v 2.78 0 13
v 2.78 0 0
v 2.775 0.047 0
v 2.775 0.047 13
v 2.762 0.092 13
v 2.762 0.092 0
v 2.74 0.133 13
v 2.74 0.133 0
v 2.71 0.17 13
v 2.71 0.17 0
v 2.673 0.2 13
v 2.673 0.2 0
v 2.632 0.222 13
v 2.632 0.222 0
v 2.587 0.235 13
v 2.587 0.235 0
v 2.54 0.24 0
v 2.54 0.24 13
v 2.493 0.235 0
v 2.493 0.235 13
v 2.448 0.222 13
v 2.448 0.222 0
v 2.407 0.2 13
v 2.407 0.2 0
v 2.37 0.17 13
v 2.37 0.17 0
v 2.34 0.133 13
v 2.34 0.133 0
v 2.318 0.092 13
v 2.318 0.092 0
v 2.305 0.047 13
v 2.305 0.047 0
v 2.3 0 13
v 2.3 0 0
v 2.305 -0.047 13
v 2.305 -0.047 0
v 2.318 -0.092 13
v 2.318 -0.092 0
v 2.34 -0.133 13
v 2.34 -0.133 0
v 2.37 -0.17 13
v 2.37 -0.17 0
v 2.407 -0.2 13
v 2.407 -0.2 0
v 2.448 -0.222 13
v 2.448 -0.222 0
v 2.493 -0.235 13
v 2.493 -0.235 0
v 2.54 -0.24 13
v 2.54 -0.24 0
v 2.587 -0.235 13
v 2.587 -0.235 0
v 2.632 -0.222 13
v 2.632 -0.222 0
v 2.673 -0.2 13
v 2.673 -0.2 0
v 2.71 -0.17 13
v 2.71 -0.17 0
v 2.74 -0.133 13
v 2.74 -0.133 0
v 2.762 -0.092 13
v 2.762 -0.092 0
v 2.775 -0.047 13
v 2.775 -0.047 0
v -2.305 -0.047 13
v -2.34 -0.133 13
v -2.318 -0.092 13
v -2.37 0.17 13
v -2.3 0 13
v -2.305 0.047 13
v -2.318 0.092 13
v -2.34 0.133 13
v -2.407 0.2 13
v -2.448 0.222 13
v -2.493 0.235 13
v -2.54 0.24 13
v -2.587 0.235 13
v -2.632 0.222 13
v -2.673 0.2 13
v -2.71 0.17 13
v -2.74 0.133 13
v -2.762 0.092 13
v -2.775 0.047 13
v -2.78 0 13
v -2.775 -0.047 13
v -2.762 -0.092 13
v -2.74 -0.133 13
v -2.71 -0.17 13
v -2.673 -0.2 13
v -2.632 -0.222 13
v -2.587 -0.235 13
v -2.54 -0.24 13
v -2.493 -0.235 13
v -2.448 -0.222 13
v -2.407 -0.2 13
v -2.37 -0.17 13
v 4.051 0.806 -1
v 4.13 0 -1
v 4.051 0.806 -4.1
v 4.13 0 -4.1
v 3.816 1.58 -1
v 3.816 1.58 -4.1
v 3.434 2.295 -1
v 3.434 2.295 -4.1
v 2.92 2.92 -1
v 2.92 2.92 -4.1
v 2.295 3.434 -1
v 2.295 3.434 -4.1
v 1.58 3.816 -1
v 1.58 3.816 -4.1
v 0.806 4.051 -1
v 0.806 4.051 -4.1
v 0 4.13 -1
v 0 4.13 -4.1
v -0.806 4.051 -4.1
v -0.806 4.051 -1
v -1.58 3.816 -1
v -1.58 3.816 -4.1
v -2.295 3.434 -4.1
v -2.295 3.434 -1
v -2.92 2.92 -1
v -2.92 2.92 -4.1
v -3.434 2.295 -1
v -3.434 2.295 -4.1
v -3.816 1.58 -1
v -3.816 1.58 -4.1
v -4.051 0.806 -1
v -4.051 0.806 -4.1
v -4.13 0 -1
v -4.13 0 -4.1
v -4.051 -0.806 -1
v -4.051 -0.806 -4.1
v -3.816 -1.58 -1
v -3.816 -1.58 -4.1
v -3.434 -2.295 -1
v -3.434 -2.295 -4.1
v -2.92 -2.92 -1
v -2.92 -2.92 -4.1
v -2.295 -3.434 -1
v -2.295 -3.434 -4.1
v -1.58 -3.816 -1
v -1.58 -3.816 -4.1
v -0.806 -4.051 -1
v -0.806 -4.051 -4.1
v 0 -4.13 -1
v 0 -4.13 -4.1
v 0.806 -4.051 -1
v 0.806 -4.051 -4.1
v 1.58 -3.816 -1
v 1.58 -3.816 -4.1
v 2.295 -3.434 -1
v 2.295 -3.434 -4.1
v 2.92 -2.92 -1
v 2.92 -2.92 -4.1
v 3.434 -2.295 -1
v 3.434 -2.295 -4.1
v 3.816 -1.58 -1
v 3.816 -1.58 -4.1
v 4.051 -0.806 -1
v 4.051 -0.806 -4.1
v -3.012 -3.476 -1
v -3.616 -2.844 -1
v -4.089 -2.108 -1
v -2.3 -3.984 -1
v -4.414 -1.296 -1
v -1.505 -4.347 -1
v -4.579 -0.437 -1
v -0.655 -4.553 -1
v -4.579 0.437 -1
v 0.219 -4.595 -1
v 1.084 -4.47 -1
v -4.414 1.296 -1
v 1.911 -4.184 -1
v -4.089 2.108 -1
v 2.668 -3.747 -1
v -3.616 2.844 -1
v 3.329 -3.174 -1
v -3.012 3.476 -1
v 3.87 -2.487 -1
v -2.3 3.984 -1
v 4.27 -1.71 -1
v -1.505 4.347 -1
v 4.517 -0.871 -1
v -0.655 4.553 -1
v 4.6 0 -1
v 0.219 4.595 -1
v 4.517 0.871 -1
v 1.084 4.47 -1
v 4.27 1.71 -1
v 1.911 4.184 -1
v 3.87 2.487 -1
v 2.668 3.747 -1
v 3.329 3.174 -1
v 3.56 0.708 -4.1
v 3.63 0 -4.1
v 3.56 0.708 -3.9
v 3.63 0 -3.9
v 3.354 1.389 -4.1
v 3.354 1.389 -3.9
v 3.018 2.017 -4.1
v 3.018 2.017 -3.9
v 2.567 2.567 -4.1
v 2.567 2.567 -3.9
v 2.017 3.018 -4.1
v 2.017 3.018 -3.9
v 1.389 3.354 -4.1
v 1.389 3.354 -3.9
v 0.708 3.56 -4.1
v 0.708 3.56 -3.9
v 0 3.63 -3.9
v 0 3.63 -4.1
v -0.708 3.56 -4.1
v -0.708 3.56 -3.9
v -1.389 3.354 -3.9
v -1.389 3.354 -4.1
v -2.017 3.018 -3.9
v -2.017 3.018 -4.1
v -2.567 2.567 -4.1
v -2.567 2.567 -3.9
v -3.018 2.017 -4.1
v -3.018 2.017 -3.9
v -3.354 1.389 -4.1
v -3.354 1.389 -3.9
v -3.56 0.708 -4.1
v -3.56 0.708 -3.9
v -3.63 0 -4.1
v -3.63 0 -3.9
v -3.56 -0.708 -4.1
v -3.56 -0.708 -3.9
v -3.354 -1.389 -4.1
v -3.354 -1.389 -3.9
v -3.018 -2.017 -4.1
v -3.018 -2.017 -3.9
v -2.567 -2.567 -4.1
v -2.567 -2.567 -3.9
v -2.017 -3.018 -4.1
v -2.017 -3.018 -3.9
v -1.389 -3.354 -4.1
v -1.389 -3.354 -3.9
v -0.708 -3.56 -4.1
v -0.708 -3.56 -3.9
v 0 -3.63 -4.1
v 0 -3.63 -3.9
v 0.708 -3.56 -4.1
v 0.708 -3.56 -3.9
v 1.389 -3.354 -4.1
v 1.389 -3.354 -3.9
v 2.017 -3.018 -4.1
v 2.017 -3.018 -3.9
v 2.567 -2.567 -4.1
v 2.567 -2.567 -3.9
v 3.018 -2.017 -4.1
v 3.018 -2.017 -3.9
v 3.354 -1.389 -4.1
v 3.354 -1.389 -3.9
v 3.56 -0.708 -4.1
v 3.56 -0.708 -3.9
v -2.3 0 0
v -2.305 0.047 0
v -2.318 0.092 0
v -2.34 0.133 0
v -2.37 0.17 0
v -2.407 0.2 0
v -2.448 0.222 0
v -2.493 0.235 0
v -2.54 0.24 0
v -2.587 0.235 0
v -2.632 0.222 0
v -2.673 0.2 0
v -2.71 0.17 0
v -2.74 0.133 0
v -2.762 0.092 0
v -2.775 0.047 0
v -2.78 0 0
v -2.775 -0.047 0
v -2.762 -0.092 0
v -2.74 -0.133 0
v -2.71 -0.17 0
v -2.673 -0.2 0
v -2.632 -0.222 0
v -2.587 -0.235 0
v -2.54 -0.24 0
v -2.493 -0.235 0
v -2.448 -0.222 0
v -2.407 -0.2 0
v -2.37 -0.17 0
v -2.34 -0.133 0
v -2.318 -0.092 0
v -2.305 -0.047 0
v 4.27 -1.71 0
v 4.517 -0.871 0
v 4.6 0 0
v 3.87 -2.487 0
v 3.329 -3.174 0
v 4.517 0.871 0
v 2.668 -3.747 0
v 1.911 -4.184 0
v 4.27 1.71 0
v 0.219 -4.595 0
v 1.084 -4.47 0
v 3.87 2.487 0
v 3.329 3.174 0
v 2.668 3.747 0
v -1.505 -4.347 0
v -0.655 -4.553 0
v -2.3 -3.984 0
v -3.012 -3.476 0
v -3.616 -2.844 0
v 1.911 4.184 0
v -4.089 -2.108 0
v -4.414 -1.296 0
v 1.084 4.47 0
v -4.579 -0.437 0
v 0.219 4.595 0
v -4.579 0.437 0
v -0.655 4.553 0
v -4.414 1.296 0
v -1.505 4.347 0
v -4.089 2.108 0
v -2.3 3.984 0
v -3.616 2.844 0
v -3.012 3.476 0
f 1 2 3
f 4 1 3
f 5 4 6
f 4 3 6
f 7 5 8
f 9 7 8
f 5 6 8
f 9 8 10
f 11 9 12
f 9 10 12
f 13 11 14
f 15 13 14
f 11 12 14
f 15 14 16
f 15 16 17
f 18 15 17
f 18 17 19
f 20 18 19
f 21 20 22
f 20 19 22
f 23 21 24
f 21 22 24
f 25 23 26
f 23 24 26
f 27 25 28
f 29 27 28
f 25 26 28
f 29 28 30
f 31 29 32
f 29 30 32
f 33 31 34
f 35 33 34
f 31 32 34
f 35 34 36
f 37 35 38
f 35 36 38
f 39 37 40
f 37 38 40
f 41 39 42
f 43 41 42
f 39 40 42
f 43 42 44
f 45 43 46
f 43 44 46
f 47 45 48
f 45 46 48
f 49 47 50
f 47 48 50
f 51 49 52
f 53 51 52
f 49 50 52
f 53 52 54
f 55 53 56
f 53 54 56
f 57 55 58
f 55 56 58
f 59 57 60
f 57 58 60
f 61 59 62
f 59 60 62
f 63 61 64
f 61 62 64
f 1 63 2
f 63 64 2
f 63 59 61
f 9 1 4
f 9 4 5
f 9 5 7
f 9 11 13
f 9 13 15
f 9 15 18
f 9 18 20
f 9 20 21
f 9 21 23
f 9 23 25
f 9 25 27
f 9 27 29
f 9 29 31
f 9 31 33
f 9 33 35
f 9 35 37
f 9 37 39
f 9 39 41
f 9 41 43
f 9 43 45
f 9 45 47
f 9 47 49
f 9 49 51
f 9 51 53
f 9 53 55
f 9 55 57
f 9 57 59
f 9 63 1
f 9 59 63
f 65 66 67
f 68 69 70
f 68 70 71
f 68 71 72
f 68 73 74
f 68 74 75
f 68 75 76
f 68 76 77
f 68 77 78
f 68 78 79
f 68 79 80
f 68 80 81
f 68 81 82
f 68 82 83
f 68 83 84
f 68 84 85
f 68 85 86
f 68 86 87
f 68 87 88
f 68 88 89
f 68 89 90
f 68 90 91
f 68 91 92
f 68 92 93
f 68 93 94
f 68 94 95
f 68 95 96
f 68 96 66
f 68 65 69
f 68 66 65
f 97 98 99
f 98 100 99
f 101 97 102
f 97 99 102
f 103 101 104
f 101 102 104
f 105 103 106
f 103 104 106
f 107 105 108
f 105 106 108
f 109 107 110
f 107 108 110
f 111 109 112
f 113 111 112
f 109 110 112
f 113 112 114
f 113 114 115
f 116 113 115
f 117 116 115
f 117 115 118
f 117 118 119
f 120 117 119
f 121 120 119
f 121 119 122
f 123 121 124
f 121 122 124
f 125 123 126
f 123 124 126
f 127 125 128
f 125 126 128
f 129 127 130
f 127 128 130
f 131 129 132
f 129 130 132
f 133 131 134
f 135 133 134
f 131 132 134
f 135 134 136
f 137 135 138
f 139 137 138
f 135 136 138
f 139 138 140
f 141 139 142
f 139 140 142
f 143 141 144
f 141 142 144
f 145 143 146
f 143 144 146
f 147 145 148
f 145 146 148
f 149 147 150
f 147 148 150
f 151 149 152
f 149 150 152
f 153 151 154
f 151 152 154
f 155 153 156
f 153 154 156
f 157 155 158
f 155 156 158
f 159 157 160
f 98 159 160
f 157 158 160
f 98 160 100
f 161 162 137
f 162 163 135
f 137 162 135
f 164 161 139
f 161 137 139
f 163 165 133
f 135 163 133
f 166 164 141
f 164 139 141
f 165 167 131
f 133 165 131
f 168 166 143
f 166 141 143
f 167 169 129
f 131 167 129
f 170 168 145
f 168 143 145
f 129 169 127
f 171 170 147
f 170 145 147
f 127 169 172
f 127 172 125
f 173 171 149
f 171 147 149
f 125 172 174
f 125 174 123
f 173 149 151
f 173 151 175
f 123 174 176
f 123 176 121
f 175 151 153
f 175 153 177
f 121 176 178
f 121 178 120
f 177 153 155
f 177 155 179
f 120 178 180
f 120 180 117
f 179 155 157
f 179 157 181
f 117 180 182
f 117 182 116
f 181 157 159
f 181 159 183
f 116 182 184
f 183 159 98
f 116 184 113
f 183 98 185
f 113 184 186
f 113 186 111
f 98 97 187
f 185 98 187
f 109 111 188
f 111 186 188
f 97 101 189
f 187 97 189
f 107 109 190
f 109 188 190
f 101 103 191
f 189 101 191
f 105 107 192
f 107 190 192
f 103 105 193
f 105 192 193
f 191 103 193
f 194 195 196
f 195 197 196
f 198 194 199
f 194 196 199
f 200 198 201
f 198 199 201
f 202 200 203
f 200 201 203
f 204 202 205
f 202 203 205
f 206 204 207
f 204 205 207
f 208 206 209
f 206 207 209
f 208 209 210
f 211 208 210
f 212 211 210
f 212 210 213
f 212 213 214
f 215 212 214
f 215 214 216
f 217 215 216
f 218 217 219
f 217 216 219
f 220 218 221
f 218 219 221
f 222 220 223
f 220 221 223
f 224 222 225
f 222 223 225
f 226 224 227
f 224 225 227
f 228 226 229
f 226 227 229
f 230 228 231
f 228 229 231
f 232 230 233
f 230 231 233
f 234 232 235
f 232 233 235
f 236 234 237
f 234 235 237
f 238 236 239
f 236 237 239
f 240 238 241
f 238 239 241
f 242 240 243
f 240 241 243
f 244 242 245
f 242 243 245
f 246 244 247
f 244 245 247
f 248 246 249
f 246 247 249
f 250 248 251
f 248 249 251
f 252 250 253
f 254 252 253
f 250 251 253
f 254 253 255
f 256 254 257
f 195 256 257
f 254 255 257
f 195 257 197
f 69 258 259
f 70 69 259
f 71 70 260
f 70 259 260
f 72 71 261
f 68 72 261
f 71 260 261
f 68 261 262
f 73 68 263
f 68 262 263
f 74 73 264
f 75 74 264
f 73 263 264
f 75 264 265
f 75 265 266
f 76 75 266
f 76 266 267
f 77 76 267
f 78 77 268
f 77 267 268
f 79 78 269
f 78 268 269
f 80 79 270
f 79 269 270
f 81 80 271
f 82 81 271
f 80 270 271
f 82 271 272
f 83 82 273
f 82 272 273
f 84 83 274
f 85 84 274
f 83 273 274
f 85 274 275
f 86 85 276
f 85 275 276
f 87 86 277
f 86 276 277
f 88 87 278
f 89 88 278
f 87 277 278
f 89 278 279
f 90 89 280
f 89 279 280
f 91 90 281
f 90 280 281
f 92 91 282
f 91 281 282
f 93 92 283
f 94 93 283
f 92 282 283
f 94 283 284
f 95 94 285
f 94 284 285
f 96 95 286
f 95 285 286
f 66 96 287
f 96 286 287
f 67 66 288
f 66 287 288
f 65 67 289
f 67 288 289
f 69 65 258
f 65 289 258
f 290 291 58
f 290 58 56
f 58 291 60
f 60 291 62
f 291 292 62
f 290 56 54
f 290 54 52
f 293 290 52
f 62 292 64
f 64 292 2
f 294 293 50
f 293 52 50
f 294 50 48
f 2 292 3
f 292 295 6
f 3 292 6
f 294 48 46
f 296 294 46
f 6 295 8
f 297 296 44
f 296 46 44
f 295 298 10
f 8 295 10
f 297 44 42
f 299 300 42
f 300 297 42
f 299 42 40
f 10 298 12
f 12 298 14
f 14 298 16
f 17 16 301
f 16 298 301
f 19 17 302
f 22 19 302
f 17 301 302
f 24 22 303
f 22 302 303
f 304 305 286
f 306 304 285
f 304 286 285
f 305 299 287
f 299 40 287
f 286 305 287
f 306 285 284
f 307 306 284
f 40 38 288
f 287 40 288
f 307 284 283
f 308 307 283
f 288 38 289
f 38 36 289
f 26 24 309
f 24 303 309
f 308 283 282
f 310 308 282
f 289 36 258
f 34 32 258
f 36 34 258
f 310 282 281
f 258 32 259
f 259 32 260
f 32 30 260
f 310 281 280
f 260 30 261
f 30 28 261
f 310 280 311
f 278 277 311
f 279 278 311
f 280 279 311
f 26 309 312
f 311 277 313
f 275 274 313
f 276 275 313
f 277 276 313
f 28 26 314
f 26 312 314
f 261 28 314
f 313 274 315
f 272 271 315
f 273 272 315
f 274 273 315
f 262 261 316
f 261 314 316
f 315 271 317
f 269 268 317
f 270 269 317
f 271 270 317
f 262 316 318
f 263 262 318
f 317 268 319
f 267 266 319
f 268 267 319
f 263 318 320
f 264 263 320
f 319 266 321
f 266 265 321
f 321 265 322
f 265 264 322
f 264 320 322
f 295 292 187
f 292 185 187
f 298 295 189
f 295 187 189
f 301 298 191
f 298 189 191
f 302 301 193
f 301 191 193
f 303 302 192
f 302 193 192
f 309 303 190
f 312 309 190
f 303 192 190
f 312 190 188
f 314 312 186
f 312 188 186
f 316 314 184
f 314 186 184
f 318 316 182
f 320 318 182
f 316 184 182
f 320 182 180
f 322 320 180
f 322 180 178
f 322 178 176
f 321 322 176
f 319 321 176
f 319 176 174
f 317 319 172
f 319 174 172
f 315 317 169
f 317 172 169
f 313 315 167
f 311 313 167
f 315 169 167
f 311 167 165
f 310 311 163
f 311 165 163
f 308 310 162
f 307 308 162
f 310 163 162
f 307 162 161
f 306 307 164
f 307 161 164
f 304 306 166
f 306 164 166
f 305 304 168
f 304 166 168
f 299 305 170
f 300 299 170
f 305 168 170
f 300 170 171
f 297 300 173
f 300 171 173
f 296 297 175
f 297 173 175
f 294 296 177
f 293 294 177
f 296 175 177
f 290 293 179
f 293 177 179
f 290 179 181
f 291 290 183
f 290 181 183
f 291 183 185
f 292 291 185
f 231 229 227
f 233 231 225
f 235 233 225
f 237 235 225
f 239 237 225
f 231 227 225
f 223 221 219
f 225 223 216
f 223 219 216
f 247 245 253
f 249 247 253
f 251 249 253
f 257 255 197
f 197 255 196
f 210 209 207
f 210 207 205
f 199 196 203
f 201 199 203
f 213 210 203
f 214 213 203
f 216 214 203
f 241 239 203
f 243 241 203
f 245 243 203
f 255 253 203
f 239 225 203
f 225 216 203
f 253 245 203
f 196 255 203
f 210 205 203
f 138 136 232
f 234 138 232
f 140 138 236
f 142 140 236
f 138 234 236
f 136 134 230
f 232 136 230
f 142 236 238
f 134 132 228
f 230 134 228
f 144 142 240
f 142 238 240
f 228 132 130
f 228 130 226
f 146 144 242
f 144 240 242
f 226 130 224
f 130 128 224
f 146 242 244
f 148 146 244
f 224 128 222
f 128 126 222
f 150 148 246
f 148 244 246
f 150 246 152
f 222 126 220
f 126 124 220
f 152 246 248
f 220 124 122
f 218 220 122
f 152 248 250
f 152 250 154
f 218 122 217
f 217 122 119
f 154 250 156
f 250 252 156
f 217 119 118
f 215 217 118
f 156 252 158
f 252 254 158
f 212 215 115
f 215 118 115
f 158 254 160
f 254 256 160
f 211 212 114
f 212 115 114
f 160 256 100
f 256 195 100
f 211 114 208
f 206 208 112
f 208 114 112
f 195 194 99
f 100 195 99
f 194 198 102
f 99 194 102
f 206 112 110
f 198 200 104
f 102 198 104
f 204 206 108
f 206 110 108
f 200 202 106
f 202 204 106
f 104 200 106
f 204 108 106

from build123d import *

# Parameters (mm, degrees)
SKETCH2_R           = 0.24
BOSS_EXTRUDE1_DEPTH = 13


with BuildPart() as part:
    # Sketch1 → Revolve1 (revolve)
    with BuildSketch(Plane(origin=(0, 0, 0), x_dir=(1, 0, 0), z_dir=(0, 1, 0))):
        Polygon((0, 0), (4.6, 0), (4.6, 1), (4.13, 1), (4.13, 4.1), (3.63, 4.1), (3.63, 3.9), (0, 3.9), align=None)
    revolve(axis=Axis((0, 0, -3.9), (0, 0, 1)))

    # Sketch2 → Boss-Extrude1 (add)
    with BuildSketch(Plane.XY):
        with Locations((-2.54, 0)):
            Circle(SKETCH2_R)
        with Locations((2.54, 0)):
            Circle(SKETCH2_R)
    extrude(amount=BOSS_EXTRUDE1_DEPTH)


solid = part.part
